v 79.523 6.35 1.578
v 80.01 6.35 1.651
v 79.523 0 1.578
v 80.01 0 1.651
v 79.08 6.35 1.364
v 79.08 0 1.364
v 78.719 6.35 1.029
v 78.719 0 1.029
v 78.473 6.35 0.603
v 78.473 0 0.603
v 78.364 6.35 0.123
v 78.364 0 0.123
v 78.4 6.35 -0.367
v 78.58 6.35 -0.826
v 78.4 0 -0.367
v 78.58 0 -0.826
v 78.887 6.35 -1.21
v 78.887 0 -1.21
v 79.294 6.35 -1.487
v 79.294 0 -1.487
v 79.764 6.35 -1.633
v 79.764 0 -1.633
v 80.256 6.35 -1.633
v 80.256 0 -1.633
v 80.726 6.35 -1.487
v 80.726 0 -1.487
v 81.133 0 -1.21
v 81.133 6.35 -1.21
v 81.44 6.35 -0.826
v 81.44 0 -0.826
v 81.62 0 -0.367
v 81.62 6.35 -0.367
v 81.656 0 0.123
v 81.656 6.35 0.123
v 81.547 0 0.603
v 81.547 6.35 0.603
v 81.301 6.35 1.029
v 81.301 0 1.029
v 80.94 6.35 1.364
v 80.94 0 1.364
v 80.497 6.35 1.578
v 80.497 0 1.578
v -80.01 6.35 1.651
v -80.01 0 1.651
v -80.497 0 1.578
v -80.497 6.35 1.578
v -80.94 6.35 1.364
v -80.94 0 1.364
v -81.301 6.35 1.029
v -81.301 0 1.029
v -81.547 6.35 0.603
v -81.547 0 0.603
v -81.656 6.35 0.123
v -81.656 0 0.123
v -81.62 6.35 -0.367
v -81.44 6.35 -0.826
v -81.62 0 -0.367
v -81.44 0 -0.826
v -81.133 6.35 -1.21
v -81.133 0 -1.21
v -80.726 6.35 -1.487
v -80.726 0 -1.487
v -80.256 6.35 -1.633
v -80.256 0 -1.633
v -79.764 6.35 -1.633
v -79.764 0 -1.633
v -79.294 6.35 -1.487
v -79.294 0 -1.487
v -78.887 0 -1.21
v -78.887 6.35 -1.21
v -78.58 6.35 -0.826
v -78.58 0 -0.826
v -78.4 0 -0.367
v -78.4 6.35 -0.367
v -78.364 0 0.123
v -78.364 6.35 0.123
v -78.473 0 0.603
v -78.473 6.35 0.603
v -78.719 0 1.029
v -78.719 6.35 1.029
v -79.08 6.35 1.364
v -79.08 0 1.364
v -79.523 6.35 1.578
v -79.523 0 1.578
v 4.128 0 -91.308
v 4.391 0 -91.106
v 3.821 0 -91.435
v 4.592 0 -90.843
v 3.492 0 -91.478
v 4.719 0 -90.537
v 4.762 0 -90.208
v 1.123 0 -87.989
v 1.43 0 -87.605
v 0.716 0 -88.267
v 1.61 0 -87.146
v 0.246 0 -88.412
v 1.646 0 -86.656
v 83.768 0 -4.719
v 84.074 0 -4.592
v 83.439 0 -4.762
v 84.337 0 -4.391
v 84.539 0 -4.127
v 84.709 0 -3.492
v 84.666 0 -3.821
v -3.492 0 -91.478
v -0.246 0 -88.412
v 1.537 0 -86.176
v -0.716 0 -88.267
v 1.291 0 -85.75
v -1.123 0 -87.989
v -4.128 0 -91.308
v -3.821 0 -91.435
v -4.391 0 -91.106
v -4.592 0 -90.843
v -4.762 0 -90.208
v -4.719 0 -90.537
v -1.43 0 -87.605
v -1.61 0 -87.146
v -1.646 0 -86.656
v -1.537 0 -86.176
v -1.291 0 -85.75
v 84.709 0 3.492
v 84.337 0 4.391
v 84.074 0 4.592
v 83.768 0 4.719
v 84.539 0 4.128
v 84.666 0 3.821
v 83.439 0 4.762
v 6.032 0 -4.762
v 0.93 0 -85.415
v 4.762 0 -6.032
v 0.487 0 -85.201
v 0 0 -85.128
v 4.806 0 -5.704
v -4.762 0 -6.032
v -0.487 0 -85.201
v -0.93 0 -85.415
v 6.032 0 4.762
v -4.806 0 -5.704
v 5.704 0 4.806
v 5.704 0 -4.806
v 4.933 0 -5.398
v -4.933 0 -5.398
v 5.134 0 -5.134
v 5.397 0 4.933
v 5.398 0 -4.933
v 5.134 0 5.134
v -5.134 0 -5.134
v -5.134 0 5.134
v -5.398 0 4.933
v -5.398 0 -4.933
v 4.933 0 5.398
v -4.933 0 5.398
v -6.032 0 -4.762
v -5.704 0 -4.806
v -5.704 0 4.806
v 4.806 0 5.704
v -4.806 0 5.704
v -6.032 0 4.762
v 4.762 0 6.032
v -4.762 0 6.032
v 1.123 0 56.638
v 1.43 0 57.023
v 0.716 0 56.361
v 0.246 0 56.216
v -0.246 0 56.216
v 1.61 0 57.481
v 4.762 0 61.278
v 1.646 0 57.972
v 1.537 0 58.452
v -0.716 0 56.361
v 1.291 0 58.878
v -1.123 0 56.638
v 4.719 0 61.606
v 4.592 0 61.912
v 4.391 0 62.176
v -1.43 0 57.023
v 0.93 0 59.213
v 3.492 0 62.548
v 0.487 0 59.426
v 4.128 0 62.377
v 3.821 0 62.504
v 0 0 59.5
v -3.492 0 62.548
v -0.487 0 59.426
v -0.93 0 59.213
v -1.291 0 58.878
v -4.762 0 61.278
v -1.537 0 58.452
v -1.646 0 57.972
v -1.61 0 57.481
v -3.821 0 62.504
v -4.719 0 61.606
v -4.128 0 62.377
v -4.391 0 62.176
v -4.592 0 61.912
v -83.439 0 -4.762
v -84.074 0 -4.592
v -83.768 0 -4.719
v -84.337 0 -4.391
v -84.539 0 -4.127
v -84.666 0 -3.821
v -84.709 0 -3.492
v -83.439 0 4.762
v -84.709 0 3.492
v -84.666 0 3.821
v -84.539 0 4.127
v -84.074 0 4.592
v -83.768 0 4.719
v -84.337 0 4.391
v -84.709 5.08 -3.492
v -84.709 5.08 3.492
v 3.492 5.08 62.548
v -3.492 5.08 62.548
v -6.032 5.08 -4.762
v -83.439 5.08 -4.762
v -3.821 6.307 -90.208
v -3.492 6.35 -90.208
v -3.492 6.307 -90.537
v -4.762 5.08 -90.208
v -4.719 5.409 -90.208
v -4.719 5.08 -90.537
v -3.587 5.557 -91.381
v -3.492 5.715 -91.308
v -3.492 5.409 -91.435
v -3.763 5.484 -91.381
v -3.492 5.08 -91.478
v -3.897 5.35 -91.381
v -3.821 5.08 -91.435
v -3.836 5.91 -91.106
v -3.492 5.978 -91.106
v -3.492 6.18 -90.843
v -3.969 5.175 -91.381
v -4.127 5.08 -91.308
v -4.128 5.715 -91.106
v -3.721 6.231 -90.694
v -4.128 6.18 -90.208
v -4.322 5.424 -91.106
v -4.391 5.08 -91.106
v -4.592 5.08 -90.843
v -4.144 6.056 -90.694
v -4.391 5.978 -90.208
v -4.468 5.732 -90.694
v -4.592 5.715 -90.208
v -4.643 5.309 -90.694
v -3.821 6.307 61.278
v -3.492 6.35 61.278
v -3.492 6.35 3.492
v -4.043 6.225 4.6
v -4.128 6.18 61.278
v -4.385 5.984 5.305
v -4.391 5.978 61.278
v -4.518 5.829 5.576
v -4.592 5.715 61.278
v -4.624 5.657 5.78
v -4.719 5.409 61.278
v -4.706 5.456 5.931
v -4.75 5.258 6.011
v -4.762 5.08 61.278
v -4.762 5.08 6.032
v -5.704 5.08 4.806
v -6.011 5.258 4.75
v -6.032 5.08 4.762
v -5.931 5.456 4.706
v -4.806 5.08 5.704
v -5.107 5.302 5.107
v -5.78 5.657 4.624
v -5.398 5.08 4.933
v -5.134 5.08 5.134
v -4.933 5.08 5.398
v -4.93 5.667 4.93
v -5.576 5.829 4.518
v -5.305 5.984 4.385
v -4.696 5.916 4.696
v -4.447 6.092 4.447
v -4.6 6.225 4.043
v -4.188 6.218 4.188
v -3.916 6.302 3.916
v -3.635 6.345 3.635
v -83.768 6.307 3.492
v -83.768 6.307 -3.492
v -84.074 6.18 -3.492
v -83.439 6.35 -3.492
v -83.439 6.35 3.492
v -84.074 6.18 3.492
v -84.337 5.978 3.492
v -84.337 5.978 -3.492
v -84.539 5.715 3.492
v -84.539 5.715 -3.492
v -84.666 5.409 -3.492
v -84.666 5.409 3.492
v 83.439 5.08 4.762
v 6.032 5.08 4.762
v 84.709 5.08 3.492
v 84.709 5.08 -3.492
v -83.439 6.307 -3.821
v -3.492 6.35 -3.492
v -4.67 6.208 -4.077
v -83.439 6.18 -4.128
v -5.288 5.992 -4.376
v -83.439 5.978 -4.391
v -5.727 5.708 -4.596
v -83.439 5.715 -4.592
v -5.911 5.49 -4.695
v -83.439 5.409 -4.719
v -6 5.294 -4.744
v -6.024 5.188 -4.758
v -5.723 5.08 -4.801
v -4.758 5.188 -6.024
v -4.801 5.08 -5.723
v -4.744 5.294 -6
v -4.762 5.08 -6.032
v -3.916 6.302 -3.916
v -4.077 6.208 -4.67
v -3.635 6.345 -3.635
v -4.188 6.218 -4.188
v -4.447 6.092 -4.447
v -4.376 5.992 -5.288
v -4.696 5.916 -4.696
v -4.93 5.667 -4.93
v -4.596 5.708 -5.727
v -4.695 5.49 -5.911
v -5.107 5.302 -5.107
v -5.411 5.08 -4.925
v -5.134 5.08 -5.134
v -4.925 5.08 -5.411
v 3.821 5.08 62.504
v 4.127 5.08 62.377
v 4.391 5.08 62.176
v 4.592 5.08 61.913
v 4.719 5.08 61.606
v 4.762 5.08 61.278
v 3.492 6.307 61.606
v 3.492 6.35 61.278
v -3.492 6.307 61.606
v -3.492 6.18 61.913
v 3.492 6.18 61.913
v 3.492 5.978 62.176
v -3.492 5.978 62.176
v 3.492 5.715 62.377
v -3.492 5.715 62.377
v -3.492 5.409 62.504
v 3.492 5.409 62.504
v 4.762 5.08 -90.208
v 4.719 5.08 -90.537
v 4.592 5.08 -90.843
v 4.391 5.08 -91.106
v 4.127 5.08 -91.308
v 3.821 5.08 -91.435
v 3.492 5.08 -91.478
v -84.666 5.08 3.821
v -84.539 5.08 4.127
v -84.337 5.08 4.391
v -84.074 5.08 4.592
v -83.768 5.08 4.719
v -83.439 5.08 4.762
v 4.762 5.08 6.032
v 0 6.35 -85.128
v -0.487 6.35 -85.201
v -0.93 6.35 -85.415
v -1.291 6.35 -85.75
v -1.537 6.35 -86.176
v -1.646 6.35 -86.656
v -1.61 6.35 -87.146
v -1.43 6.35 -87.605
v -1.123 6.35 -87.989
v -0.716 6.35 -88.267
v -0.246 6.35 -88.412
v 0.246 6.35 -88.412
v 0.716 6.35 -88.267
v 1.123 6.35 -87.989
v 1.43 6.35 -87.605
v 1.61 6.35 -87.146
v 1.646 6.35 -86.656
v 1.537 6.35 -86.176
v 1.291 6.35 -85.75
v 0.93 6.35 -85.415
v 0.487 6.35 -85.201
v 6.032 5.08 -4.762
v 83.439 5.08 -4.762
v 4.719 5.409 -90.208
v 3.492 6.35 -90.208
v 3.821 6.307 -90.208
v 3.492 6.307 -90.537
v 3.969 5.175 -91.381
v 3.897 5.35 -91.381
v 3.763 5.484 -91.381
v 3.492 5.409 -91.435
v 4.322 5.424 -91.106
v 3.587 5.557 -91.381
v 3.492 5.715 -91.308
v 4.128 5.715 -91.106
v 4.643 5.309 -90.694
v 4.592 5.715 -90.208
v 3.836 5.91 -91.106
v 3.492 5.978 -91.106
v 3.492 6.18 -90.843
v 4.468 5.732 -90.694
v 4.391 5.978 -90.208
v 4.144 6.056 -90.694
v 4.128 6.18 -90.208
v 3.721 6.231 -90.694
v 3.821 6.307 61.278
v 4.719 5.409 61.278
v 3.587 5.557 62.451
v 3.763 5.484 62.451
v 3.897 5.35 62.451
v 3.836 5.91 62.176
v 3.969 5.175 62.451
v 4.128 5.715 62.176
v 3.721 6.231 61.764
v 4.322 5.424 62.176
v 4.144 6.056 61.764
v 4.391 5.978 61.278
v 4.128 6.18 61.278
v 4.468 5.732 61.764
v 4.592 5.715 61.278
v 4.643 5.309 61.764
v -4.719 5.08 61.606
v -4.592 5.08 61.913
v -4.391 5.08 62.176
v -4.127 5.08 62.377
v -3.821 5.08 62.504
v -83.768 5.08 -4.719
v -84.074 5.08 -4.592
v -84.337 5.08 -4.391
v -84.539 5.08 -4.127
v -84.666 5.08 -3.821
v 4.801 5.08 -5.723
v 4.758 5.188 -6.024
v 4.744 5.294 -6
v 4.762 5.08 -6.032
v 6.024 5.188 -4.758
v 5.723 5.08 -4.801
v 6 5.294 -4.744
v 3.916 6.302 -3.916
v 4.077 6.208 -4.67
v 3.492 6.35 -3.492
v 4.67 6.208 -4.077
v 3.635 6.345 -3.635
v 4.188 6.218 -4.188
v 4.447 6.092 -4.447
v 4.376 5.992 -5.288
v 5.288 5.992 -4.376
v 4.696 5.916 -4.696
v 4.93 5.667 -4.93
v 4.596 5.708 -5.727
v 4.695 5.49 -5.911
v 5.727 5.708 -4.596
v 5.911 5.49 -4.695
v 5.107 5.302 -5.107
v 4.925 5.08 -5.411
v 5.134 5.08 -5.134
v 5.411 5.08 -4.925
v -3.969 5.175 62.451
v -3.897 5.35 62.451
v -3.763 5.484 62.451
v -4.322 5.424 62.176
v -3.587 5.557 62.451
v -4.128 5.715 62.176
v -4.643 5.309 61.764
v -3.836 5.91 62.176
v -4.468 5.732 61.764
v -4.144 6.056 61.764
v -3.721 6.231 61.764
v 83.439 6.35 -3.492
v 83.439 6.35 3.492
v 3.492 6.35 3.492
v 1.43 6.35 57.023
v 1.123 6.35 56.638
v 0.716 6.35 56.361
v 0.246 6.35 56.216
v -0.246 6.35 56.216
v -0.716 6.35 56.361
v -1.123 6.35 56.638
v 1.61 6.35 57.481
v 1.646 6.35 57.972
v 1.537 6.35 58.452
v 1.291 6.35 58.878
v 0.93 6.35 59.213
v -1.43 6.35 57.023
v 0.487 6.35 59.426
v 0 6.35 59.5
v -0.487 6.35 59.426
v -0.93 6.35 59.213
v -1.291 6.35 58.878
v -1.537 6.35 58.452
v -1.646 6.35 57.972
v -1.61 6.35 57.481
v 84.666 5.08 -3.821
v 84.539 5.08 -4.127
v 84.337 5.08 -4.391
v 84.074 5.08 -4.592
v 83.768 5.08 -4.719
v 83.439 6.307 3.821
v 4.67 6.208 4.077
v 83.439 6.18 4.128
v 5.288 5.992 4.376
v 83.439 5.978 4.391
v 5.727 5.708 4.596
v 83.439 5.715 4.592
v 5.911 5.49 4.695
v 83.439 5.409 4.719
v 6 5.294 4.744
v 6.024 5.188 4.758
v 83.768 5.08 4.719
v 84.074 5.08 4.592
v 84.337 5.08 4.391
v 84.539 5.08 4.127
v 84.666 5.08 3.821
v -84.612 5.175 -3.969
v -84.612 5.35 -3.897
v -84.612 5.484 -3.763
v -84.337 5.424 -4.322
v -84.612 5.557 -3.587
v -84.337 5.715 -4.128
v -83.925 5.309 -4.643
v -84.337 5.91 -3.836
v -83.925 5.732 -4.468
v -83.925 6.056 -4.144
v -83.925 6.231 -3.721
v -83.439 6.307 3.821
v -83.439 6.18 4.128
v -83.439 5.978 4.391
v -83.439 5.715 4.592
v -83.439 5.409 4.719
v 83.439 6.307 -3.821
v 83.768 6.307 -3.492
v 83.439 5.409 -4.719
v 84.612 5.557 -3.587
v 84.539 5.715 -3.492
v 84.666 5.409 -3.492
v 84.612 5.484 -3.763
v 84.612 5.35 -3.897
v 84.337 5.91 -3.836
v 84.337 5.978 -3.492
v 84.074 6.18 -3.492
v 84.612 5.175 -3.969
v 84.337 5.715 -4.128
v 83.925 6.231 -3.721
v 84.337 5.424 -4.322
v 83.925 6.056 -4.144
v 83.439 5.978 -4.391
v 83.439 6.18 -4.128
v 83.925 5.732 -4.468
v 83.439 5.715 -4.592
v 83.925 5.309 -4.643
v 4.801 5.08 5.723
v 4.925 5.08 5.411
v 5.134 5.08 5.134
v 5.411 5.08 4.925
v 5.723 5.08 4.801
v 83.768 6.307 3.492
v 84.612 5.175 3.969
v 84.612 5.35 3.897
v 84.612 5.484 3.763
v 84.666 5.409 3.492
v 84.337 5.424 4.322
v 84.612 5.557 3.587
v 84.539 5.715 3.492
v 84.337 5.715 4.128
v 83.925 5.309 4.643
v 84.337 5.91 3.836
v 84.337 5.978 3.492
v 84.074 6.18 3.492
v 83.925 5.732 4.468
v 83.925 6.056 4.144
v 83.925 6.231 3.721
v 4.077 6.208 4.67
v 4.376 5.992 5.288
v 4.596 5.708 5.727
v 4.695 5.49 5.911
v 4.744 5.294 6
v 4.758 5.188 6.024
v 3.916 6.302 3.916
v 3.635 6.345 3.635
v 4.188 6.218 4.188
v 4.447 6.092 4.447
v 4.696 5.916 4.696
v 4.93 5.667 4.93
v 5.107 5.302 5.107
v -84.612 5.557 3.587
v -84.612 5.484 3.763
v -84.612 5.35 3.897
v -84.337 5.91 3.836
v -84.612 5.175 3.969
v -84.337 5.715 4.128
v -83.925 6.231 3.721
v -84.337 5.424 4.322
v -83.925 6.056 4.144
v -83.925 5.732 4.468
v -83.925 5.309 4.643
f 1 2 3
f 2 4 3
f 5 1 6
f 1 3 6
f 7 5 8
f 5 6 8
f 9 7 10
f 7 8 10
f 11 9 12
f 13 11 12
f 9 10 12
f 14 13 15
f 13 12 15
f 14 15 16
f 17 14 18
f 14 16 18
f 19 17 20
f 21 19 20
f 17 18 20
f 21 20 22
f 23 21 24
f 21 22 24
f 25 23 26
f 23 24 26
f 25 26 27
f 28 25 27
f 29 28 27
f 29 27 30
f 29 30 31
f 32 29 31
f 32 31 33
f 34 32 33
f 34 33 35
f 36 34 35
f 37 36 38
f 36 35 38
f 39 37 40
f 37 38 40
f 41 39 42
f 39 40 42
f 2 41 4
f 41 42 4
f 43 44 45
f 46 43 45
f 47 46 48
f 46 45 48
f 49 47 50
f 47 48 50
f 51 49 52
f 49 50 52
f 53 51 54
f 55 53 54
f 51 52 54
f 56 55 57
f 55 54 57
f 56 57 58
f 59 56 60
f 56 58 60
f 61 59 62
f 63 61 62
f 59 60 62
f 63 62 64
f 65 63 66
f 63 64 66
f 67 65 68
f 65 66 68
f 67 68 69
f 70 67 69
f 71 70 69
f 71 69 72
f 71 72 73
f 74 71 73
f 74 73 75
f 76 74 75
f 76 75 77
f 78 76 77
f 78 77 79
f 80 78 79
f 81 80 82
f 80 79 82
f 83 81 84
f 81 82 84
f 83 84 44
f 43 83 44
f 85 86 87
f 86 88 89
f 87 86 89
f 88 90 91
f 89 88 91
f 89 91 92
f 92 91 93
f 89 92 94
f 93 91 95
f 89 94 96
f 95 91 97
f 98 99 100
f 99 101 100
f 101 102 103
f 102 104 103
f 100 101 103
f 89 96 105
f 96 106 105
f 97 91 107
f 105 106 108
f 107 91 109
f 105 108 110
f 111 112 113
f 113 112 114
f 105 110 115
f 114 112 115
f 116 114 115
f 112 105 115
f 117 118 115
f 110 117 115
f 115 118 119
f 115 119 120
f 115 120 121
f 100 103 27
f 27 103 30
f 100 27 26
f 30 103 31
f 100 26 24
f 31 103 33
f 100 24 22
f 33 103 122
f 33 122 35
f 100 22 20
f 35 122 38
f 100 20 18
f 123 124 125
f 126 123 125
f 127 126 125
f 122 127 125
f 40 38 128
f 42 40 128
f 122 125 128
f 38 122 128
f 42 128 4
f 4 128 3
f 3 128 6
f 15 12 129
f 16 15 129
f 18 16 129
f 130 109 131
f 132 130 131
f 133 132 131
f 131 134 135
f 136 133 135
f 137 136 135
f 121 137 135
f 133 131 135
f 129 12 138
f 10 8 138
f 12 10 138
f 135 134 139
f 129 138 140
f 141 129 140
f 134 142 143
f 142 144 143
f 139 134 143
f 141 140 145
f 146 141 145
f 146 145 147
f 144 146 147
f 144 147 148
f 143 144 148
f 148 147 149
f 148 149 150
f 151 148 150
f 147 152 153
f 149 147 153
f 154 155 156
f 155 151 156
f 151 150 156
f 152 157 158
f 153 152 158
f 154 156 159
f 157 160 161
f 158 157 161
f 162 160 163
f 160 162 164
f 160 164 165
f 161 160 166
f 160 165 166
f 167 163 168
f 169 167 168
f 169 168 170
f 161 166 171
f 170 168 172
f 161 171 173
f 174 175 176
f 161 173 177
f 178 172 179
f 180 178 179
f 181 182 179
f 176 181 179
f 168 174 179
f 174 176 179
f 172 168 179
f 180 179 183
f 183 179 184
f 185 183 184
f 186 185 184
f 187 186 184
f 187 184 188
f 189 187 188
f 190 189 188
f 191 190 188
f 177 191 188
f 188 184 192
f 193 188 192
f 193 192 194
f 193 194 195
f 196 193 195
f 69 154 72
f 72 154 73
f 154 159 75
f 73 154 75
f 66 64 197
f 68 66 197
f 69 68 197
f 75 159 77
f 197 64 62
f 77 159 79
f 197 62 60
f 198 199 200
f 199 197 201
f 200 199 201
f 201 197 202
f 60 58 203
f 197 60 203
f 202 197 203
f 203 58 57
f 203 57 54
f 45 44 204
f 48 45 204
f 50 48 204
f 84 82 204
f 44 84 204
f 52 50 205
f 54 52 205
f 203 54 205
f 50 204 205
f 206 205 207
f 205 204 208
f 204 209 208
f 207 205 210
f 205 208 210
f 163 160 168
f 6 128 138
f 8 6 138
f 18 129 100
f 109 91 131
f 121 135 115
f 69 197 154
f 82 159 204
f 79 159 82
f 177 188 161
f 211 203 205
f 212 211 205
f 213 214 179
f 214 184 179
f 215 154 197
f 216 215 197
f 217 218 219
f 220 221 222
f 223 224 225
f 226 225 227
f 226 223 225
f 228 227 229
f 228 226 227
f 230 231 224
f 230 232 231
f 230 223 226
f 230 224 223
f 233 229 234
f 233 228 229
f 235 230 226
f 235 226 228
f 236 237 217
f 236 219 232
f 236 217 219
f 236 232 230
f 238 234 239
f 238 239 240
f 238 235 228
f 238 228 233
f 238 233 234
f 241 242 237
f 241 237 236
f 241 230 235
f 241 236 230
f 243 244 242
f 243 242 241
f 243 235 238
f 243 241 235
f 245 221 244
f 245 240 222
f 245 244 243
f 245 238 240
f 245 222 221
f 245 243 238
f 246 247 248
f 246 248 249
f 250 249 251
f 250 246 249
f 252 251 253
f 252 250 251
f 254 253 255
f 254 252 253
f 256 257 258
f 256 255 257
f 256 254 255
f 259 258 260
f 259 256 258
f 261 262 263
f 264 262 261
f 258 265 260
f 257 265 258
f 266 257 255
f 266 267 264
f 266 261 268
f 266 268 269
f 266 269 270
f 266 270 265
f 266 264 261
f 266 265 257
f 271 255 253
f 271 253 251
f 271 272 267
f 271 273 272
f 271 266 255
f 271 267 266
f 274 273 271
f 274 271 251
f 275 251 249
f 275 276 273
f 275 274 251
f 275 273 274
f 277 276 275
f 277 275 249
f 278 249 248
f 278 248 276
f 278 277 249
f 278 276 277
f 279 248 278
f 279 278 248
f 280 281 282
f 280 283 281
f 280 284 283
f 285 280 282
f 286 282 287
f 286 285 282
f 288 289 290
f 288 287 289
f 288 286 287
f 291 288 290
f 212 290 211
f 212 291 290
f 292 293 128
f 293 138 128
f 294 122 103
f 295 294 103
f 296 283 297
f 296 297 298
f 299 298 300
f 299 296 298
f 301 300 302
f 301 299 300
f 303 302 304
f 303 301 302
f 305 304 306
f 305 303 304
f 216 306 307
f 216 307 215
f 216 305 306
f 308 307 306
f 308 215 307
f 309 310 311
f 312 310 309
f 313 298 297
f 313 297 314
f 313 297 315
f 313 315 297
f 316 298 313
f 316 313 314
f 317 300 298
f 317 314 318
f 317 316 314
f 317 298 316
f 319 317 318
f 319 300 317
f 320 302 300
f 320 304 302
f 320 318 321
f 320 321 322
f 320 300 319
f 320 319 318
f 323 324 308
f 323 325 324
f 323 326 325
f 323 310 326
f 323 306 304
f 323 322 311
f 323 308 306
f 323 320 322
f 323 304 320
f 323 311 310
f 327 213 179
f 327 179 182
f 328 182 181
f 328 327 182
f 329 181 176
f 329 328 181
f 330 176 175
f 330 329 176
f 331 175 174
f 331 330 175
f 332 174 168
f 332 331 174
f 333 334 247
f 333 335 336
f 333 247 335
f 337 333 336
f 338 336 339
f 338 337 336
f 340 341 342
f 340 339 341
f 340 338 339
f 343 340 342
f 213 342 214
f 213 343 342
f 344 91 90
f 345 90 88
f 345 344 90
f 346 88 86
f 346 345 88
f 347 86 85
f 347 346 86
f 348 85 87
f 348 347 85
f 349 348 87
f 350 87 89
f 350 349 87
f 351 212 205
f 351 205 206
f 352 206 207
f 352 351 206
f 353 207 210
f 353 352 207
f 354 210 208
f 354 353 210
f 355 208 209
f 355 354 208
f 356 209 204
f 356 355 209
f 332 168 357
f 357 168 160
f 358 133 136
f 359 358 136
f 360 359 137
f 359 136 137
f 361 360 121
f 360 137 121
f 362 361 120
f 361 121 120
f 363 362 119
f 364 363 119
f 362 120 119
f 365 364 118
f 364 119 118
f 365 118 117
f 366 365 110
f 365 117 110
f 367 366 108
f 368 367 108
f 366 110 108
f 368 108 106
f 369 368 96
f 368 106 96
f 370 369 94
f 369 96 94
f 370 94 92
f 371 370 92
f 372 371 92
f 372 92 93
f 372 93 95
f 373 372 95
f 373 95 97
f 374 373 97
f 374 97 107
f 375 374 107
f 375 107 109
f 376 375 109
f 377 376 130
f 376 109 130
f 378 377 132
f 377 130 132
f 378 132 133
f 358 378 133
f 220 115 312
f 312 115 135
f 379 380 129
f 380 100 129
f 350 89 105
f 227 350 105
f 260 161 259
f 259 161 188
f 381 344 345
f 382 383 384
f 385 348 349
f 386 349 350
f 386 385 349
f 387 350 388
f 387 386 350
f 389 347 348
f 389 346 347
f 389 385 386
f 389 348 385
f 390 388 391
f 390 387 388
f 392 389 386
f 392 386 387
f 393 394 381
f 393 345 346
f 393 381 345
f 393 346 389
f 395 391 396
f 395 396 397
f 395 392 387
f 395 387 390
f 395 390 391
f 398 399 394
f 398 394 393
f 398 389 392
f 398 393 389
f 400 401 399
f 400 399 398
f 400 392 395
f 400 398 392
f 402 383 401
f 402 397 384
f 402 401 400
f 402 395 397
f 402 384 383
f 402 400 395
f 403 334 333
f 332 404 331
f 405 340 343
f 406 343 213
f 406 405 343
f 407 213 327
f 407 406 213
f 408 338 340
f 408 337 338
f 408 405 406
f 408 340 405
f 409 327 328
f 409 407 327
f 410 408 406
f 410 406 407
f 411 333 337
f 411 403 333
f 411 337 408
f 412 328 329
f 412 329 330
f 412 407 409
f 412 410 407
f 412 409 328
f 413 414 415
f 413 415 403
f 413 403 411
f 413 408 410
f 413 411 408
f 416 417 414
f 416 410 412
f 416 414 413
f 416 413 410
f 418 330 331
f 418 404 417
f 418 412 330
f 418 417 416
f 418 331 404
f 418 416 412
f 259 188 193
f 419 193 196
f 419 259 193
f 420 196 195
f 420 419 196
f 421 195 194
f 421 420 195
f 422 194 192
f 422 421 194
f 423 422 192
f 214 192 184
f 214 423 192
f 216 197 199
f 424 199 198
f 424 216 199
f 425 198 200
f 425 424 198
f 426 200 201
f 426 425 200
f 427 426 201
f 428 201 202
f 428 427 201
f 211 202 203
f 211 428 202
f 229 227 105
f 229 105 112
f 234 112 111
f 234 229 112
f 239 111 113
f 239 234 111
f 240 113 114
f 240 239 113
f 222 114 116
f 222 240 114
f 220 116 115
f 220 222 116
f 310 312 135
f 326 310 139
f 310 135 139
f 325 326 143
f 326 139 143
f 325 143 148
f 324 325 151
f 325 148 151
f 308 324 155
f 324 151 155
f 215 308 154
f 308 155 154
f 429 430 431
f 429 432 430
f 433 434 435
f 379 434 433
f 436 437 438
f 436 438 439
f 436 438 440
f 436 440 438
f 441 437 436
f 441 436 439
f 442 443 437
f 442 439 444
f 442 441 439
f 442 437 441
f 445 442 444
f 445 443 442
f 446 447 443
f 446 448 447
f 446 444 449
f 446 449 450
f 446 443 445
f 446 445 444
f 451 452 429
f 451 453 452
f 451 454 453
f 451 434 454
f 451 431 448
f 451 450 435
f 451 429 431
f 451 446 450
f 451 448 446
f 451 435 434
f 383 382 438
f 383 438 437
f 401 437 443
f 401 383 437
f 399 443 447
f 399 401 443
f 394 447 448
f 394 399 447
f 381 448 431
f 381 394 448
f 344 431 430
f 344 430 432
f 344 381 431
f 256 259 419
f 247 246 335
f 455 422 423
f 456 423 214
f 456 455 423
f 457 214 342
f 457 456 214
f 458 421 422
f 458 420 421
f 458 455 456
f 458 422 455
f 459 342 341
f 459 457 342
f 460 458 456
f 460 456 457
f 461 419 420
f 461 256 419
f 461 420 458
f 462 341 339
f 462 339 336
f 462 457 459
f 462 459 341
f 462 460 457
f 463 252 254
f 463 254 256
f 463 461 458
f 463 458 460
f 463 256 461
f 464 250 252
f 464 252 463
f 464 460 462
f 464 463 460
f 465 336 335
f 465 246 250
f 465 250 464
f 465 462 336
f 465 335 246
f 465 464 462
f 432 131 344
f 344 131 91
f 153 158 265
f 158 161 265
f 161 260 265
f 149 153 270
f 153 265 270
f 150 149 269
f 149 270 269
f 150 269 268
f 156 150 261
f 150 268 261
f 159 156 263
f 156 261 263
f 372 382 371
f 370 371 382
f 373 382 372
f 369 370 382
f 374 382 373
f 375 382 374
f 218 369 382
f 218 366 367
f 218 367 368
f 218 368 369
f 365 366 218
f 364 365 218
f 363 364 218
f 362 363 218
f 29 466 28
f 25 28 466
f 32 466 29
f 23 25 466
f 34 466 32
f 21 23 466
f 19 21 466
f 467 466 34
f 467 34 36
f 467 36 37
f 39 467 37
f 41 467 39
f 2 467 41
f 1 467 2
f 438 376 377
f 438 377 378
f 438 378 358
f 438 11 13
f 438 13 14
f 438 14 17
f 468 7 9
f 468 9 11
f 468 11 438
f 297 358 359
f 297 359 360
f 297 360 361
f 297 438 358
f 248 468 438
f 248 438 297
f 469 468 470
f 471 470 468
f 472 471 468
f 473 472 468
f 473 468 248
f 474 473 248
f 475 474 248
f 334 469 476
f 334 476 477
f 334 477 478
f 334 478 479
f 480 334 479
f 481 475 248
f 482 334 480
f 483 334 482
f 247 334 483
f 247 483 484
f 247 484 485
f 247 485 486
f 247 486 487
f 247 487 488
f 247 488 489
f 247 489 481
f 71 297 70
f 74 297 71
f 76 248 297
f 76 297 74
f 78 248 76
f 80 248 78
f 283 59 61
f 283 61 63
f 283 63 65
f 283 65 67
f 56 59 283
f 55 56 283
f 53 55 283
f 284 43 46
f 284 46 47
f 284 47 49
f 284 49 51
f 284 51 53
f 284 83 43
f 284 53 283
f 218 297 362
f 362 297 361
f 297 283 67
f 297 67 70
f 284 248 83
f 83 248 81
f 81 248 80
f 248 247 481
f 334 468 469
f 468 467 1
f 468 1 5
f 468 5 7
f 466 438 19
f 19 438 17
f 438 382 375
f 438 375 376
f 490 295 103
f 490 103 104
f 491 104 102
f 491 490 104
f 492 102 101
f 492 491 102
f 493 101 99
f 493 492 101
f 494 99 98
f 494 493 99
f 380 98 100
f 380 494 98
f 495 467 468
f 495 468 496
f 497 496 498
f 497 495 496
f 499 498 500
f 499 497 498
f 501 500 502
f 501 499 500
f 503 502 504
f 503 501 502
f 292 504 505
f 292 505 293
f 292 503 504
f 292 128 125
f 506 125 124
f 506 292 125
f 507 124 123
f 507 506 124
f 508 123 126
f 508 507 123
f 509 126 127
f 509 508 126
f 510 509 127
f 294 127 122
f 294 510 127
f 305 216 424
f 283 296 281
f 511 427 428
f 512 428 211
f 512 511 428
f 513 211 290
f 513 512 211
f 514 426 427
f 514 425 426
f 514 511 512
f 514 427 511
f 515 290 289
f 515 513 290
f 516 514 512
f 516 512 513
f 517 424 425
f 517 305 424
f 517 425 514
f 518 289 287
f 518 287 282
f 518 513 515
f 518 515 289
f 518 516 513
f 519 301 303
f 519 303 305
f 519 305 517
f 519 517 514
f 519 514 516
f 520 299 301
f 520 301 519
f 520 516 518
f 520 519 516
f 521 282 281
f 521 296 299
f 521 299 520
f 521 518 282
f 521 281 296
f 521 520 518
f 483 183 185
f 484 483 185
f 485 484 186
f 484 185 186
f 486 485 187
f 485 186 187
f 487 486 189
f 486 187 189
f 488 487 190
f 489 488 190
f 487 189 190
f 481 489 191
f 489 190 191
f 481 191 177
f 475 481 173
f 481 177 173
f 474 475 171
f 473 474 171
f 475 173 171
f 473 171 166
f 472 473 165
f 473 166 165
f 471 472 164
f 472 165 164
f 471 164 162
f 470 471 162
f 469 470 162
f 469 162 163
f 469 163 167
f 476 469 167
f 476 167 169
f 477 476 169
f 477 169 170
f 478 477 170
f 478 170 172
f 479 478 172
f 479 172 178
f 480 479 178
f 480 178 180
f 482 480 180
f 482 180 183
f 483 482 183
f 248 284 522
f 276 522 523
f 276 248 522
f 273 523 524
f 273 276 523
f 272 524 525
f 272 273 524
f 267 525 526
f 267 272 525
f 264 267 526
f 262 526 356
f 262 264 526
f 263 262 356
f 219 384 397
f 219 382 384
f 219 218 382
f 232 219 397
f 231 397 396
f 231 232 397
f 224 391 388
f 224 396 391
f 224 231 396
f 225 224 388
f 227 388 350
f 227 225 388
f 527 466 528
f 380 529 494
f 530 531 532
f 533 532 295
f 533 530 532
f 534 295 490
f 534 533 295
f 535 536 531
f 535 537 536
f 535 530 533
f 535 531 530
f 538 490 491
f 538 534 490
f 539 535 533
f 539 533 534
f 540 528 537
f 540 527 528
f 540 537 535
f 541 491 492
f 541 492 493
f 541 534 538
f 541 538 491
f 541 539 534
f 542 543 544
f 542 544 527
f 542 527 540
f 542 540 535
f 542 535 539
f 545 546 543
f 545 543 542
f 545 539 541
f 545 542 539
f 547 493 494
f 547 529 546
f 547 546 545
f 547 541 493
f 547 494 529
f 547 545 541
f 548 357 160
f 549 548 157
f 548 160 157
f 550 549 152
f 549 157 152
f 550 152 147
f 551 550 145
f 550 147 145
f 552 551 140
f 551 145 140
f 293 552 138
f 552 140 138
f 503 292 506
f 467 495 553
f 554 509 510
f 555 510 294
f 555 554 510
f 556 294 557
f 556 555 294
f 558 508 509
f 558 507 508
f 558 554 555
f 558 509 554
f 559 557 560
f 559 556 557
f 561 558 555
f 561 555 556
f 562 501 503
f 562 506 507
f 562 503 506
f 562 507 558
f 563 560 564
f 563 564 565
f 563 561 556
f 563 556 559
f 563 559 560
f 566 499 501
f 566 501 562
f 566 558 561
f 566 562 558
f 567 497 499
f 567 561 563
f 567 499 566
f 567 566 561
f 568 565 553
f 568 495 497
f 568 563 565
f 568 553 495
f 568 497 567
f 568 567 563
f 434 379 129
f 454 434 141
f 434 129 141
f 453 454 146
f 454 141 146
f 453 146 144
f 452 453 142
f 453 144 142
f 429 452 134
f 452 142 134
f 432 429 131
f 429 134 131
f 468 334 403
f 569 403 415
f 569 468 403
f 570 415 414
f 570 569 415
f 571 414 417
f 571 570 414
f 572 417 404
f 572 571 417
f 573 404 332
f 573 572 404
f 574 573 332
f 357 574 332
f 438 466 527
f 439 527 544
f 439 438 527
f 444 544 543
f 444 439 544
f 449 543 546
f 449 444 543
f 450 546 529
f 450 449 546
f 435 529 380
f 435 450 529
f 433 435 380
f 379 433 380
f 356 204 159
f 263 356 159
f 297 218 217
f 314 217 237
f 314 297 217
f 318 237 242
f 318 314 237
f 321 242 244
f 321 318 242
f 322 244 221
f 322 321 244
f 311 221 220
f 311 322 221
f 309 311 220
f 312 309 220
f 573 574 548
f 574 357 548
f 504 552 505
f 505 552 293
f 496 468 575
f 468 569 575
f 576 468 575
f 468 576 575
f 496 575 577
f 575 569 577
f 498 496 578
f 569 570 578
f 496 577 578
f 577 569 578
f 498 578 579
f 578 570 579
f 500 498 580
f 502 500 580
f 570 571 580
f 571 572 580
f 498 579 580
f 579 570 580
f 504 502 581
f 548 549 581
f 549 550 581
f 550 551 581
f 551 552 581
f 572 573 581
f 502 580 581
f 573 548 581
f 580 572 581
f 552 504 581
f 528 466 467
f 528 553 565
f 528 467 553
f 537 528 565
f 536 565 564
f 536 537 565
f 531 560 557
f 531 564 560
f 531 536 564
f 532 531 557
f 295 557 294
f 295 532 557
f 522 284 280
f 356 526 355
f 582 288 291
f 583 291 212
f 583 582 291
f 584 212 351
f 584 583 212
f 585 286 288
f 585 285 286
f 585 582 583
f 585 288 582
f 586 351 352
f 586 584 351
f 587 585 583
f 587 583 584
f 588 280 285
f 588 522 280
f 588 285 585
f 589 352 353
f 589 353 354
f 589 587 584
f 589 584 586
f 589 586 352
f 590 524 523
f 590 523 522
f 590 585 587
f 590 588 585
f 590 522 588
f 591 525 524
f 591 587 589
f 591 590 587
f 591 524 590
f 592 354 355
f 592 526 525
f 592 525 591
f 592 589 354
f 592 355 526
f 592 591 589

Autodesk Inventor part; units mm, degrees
ref_plane "YZ Plane" through (0, 0, 0) normal (1, 0, 0) x (0, 1, 0)
ref_plane "XZ Plane" through (0, 0, 0) normal (0, 1, 0) x (-1, 0, 0)
ref_plane "XY Plane" through (0, 0, 0) normal (0, 0, 1) x (1, 0, 0)
sketch "Sketch1" plane through (0, 0, 0) normal (0, 1, 0) x (-1, 0, 0)
  line L0 (84.709, 4.7625) -> (-84.709, 4.7625)
  line L1 (-84.709, 4.7625) -> (-84.709, -4.7625)
  line L2 (-84.709, -4.7625) -> (84.709, -4.7625)
  line L3 (84.709, -4.7625) -> (84.709, 4.7625)
  line L4 (4.7625, 62.5475) -> (-4.7625, 62.5475)
  line L5 (-4.7625, 62.5475) -> (-4.7625, -91.4781)
  line L6 (-4.7625, -91.4781) -> (4.7625, -91.4781)
  line L7 (4.7625, -91.4781) -> (4.7625, 62.5475)
  point P0 (0, 0)
  point P1 (0, -4.7625)
  point P2 (84.709, 0)
  point P3 (4.7625, -14.4653)
  point P4 (0, 62.5475)
  dimension "d0" = 9.525
  dimension "d1" = 169.418
  dimension "d2" = 154.0256
  dimension "d6" = 57.785
extrude "Extrusion1" add sketch "Sketch1" along normal blind 6.35
sketch "Sketch2" plane through (0, 6.35, 0) normal (0, 1, 0) x (1, 0, 0)
  line L0 (4.7625, 91.4781) -> (-4.7625, 91.4781) projected
  line L1 (84.709, -4.7625) -> (84.709, 4.7625) projected
  line L2 (-4.7625, -62.5475) -> (4.7625, -62.5475) projected
  line L3 (-84.709, 4.7625) -> (-84.709, -4.7625) projected
  point P0 (0, 0)
  point P1 (0, 86.7791)
  point P2 (0, -57.8485)
  point P3 (-80.01, 0)
  point P4 (80.01, 0)
  dimension "d7" = 4.699
  dimension "d8" = 4.699
  dimension "d9" = 4.699
  dimension "d10" = 4.699
hole "Hole1" at (0, 6.35, -86.7791) at (0, 6.35, 57.8485) at (-80.01, 6.35, 0) at (80.01, 6.35, 0) direction (0, -1, 0) diameter 3.302 end through all
fillet "Fillet1" radius 1.27 20 edges at (-44.7358, 6.35, 4.7625) (4.7625, 6.35, 33.655) (-4.7625, 6.35, 33.655) (44.7357, 6.35, 4.7625) (4.7625, 6.35, -48.1203) (-4.7625, 6.35, -48.1203) (-44.7357, 6.35, -4.7625) (44.7358, 6.35, -4.7625) (84.709, 3.175, 4.7625) (84.709, 3.175, -4.7625) (84.709, 6.35, 0) (4.7625, 3.175, 62.5475) (0, 6.35, 62.5475) (-4.7625, 3.175, 62.5475) (-84.709, 3.175, 4.7625) (-84.709, 6.35, 0) (4.7625, 3.175, -91.4781) (0, 6.35, -91.4781) (-4.7625, 3.175, -91.4781) (-84.709, 3.175, -4.7625)
fillet "Fillet2" radius 1.27 8 edges at (4.3905, 5.978, 4.3905) (4.7625, 2.54, 4.7625) (4.3905, 5.978, -4.3905) (4.7625, 2.54, -4.7625) (-4.3905, 5.978, -4.3905) (-4.7625, 2.54, -4.7625) (-4.3905, 5.978, 4.3905) (-4.7625, 2.54, 4.7625)
equation "\"d8\" = d7"
equation "\"d9\" = d7"
equation "\"d10\" = d7"
properties part number "BatteryCrossStrap"
